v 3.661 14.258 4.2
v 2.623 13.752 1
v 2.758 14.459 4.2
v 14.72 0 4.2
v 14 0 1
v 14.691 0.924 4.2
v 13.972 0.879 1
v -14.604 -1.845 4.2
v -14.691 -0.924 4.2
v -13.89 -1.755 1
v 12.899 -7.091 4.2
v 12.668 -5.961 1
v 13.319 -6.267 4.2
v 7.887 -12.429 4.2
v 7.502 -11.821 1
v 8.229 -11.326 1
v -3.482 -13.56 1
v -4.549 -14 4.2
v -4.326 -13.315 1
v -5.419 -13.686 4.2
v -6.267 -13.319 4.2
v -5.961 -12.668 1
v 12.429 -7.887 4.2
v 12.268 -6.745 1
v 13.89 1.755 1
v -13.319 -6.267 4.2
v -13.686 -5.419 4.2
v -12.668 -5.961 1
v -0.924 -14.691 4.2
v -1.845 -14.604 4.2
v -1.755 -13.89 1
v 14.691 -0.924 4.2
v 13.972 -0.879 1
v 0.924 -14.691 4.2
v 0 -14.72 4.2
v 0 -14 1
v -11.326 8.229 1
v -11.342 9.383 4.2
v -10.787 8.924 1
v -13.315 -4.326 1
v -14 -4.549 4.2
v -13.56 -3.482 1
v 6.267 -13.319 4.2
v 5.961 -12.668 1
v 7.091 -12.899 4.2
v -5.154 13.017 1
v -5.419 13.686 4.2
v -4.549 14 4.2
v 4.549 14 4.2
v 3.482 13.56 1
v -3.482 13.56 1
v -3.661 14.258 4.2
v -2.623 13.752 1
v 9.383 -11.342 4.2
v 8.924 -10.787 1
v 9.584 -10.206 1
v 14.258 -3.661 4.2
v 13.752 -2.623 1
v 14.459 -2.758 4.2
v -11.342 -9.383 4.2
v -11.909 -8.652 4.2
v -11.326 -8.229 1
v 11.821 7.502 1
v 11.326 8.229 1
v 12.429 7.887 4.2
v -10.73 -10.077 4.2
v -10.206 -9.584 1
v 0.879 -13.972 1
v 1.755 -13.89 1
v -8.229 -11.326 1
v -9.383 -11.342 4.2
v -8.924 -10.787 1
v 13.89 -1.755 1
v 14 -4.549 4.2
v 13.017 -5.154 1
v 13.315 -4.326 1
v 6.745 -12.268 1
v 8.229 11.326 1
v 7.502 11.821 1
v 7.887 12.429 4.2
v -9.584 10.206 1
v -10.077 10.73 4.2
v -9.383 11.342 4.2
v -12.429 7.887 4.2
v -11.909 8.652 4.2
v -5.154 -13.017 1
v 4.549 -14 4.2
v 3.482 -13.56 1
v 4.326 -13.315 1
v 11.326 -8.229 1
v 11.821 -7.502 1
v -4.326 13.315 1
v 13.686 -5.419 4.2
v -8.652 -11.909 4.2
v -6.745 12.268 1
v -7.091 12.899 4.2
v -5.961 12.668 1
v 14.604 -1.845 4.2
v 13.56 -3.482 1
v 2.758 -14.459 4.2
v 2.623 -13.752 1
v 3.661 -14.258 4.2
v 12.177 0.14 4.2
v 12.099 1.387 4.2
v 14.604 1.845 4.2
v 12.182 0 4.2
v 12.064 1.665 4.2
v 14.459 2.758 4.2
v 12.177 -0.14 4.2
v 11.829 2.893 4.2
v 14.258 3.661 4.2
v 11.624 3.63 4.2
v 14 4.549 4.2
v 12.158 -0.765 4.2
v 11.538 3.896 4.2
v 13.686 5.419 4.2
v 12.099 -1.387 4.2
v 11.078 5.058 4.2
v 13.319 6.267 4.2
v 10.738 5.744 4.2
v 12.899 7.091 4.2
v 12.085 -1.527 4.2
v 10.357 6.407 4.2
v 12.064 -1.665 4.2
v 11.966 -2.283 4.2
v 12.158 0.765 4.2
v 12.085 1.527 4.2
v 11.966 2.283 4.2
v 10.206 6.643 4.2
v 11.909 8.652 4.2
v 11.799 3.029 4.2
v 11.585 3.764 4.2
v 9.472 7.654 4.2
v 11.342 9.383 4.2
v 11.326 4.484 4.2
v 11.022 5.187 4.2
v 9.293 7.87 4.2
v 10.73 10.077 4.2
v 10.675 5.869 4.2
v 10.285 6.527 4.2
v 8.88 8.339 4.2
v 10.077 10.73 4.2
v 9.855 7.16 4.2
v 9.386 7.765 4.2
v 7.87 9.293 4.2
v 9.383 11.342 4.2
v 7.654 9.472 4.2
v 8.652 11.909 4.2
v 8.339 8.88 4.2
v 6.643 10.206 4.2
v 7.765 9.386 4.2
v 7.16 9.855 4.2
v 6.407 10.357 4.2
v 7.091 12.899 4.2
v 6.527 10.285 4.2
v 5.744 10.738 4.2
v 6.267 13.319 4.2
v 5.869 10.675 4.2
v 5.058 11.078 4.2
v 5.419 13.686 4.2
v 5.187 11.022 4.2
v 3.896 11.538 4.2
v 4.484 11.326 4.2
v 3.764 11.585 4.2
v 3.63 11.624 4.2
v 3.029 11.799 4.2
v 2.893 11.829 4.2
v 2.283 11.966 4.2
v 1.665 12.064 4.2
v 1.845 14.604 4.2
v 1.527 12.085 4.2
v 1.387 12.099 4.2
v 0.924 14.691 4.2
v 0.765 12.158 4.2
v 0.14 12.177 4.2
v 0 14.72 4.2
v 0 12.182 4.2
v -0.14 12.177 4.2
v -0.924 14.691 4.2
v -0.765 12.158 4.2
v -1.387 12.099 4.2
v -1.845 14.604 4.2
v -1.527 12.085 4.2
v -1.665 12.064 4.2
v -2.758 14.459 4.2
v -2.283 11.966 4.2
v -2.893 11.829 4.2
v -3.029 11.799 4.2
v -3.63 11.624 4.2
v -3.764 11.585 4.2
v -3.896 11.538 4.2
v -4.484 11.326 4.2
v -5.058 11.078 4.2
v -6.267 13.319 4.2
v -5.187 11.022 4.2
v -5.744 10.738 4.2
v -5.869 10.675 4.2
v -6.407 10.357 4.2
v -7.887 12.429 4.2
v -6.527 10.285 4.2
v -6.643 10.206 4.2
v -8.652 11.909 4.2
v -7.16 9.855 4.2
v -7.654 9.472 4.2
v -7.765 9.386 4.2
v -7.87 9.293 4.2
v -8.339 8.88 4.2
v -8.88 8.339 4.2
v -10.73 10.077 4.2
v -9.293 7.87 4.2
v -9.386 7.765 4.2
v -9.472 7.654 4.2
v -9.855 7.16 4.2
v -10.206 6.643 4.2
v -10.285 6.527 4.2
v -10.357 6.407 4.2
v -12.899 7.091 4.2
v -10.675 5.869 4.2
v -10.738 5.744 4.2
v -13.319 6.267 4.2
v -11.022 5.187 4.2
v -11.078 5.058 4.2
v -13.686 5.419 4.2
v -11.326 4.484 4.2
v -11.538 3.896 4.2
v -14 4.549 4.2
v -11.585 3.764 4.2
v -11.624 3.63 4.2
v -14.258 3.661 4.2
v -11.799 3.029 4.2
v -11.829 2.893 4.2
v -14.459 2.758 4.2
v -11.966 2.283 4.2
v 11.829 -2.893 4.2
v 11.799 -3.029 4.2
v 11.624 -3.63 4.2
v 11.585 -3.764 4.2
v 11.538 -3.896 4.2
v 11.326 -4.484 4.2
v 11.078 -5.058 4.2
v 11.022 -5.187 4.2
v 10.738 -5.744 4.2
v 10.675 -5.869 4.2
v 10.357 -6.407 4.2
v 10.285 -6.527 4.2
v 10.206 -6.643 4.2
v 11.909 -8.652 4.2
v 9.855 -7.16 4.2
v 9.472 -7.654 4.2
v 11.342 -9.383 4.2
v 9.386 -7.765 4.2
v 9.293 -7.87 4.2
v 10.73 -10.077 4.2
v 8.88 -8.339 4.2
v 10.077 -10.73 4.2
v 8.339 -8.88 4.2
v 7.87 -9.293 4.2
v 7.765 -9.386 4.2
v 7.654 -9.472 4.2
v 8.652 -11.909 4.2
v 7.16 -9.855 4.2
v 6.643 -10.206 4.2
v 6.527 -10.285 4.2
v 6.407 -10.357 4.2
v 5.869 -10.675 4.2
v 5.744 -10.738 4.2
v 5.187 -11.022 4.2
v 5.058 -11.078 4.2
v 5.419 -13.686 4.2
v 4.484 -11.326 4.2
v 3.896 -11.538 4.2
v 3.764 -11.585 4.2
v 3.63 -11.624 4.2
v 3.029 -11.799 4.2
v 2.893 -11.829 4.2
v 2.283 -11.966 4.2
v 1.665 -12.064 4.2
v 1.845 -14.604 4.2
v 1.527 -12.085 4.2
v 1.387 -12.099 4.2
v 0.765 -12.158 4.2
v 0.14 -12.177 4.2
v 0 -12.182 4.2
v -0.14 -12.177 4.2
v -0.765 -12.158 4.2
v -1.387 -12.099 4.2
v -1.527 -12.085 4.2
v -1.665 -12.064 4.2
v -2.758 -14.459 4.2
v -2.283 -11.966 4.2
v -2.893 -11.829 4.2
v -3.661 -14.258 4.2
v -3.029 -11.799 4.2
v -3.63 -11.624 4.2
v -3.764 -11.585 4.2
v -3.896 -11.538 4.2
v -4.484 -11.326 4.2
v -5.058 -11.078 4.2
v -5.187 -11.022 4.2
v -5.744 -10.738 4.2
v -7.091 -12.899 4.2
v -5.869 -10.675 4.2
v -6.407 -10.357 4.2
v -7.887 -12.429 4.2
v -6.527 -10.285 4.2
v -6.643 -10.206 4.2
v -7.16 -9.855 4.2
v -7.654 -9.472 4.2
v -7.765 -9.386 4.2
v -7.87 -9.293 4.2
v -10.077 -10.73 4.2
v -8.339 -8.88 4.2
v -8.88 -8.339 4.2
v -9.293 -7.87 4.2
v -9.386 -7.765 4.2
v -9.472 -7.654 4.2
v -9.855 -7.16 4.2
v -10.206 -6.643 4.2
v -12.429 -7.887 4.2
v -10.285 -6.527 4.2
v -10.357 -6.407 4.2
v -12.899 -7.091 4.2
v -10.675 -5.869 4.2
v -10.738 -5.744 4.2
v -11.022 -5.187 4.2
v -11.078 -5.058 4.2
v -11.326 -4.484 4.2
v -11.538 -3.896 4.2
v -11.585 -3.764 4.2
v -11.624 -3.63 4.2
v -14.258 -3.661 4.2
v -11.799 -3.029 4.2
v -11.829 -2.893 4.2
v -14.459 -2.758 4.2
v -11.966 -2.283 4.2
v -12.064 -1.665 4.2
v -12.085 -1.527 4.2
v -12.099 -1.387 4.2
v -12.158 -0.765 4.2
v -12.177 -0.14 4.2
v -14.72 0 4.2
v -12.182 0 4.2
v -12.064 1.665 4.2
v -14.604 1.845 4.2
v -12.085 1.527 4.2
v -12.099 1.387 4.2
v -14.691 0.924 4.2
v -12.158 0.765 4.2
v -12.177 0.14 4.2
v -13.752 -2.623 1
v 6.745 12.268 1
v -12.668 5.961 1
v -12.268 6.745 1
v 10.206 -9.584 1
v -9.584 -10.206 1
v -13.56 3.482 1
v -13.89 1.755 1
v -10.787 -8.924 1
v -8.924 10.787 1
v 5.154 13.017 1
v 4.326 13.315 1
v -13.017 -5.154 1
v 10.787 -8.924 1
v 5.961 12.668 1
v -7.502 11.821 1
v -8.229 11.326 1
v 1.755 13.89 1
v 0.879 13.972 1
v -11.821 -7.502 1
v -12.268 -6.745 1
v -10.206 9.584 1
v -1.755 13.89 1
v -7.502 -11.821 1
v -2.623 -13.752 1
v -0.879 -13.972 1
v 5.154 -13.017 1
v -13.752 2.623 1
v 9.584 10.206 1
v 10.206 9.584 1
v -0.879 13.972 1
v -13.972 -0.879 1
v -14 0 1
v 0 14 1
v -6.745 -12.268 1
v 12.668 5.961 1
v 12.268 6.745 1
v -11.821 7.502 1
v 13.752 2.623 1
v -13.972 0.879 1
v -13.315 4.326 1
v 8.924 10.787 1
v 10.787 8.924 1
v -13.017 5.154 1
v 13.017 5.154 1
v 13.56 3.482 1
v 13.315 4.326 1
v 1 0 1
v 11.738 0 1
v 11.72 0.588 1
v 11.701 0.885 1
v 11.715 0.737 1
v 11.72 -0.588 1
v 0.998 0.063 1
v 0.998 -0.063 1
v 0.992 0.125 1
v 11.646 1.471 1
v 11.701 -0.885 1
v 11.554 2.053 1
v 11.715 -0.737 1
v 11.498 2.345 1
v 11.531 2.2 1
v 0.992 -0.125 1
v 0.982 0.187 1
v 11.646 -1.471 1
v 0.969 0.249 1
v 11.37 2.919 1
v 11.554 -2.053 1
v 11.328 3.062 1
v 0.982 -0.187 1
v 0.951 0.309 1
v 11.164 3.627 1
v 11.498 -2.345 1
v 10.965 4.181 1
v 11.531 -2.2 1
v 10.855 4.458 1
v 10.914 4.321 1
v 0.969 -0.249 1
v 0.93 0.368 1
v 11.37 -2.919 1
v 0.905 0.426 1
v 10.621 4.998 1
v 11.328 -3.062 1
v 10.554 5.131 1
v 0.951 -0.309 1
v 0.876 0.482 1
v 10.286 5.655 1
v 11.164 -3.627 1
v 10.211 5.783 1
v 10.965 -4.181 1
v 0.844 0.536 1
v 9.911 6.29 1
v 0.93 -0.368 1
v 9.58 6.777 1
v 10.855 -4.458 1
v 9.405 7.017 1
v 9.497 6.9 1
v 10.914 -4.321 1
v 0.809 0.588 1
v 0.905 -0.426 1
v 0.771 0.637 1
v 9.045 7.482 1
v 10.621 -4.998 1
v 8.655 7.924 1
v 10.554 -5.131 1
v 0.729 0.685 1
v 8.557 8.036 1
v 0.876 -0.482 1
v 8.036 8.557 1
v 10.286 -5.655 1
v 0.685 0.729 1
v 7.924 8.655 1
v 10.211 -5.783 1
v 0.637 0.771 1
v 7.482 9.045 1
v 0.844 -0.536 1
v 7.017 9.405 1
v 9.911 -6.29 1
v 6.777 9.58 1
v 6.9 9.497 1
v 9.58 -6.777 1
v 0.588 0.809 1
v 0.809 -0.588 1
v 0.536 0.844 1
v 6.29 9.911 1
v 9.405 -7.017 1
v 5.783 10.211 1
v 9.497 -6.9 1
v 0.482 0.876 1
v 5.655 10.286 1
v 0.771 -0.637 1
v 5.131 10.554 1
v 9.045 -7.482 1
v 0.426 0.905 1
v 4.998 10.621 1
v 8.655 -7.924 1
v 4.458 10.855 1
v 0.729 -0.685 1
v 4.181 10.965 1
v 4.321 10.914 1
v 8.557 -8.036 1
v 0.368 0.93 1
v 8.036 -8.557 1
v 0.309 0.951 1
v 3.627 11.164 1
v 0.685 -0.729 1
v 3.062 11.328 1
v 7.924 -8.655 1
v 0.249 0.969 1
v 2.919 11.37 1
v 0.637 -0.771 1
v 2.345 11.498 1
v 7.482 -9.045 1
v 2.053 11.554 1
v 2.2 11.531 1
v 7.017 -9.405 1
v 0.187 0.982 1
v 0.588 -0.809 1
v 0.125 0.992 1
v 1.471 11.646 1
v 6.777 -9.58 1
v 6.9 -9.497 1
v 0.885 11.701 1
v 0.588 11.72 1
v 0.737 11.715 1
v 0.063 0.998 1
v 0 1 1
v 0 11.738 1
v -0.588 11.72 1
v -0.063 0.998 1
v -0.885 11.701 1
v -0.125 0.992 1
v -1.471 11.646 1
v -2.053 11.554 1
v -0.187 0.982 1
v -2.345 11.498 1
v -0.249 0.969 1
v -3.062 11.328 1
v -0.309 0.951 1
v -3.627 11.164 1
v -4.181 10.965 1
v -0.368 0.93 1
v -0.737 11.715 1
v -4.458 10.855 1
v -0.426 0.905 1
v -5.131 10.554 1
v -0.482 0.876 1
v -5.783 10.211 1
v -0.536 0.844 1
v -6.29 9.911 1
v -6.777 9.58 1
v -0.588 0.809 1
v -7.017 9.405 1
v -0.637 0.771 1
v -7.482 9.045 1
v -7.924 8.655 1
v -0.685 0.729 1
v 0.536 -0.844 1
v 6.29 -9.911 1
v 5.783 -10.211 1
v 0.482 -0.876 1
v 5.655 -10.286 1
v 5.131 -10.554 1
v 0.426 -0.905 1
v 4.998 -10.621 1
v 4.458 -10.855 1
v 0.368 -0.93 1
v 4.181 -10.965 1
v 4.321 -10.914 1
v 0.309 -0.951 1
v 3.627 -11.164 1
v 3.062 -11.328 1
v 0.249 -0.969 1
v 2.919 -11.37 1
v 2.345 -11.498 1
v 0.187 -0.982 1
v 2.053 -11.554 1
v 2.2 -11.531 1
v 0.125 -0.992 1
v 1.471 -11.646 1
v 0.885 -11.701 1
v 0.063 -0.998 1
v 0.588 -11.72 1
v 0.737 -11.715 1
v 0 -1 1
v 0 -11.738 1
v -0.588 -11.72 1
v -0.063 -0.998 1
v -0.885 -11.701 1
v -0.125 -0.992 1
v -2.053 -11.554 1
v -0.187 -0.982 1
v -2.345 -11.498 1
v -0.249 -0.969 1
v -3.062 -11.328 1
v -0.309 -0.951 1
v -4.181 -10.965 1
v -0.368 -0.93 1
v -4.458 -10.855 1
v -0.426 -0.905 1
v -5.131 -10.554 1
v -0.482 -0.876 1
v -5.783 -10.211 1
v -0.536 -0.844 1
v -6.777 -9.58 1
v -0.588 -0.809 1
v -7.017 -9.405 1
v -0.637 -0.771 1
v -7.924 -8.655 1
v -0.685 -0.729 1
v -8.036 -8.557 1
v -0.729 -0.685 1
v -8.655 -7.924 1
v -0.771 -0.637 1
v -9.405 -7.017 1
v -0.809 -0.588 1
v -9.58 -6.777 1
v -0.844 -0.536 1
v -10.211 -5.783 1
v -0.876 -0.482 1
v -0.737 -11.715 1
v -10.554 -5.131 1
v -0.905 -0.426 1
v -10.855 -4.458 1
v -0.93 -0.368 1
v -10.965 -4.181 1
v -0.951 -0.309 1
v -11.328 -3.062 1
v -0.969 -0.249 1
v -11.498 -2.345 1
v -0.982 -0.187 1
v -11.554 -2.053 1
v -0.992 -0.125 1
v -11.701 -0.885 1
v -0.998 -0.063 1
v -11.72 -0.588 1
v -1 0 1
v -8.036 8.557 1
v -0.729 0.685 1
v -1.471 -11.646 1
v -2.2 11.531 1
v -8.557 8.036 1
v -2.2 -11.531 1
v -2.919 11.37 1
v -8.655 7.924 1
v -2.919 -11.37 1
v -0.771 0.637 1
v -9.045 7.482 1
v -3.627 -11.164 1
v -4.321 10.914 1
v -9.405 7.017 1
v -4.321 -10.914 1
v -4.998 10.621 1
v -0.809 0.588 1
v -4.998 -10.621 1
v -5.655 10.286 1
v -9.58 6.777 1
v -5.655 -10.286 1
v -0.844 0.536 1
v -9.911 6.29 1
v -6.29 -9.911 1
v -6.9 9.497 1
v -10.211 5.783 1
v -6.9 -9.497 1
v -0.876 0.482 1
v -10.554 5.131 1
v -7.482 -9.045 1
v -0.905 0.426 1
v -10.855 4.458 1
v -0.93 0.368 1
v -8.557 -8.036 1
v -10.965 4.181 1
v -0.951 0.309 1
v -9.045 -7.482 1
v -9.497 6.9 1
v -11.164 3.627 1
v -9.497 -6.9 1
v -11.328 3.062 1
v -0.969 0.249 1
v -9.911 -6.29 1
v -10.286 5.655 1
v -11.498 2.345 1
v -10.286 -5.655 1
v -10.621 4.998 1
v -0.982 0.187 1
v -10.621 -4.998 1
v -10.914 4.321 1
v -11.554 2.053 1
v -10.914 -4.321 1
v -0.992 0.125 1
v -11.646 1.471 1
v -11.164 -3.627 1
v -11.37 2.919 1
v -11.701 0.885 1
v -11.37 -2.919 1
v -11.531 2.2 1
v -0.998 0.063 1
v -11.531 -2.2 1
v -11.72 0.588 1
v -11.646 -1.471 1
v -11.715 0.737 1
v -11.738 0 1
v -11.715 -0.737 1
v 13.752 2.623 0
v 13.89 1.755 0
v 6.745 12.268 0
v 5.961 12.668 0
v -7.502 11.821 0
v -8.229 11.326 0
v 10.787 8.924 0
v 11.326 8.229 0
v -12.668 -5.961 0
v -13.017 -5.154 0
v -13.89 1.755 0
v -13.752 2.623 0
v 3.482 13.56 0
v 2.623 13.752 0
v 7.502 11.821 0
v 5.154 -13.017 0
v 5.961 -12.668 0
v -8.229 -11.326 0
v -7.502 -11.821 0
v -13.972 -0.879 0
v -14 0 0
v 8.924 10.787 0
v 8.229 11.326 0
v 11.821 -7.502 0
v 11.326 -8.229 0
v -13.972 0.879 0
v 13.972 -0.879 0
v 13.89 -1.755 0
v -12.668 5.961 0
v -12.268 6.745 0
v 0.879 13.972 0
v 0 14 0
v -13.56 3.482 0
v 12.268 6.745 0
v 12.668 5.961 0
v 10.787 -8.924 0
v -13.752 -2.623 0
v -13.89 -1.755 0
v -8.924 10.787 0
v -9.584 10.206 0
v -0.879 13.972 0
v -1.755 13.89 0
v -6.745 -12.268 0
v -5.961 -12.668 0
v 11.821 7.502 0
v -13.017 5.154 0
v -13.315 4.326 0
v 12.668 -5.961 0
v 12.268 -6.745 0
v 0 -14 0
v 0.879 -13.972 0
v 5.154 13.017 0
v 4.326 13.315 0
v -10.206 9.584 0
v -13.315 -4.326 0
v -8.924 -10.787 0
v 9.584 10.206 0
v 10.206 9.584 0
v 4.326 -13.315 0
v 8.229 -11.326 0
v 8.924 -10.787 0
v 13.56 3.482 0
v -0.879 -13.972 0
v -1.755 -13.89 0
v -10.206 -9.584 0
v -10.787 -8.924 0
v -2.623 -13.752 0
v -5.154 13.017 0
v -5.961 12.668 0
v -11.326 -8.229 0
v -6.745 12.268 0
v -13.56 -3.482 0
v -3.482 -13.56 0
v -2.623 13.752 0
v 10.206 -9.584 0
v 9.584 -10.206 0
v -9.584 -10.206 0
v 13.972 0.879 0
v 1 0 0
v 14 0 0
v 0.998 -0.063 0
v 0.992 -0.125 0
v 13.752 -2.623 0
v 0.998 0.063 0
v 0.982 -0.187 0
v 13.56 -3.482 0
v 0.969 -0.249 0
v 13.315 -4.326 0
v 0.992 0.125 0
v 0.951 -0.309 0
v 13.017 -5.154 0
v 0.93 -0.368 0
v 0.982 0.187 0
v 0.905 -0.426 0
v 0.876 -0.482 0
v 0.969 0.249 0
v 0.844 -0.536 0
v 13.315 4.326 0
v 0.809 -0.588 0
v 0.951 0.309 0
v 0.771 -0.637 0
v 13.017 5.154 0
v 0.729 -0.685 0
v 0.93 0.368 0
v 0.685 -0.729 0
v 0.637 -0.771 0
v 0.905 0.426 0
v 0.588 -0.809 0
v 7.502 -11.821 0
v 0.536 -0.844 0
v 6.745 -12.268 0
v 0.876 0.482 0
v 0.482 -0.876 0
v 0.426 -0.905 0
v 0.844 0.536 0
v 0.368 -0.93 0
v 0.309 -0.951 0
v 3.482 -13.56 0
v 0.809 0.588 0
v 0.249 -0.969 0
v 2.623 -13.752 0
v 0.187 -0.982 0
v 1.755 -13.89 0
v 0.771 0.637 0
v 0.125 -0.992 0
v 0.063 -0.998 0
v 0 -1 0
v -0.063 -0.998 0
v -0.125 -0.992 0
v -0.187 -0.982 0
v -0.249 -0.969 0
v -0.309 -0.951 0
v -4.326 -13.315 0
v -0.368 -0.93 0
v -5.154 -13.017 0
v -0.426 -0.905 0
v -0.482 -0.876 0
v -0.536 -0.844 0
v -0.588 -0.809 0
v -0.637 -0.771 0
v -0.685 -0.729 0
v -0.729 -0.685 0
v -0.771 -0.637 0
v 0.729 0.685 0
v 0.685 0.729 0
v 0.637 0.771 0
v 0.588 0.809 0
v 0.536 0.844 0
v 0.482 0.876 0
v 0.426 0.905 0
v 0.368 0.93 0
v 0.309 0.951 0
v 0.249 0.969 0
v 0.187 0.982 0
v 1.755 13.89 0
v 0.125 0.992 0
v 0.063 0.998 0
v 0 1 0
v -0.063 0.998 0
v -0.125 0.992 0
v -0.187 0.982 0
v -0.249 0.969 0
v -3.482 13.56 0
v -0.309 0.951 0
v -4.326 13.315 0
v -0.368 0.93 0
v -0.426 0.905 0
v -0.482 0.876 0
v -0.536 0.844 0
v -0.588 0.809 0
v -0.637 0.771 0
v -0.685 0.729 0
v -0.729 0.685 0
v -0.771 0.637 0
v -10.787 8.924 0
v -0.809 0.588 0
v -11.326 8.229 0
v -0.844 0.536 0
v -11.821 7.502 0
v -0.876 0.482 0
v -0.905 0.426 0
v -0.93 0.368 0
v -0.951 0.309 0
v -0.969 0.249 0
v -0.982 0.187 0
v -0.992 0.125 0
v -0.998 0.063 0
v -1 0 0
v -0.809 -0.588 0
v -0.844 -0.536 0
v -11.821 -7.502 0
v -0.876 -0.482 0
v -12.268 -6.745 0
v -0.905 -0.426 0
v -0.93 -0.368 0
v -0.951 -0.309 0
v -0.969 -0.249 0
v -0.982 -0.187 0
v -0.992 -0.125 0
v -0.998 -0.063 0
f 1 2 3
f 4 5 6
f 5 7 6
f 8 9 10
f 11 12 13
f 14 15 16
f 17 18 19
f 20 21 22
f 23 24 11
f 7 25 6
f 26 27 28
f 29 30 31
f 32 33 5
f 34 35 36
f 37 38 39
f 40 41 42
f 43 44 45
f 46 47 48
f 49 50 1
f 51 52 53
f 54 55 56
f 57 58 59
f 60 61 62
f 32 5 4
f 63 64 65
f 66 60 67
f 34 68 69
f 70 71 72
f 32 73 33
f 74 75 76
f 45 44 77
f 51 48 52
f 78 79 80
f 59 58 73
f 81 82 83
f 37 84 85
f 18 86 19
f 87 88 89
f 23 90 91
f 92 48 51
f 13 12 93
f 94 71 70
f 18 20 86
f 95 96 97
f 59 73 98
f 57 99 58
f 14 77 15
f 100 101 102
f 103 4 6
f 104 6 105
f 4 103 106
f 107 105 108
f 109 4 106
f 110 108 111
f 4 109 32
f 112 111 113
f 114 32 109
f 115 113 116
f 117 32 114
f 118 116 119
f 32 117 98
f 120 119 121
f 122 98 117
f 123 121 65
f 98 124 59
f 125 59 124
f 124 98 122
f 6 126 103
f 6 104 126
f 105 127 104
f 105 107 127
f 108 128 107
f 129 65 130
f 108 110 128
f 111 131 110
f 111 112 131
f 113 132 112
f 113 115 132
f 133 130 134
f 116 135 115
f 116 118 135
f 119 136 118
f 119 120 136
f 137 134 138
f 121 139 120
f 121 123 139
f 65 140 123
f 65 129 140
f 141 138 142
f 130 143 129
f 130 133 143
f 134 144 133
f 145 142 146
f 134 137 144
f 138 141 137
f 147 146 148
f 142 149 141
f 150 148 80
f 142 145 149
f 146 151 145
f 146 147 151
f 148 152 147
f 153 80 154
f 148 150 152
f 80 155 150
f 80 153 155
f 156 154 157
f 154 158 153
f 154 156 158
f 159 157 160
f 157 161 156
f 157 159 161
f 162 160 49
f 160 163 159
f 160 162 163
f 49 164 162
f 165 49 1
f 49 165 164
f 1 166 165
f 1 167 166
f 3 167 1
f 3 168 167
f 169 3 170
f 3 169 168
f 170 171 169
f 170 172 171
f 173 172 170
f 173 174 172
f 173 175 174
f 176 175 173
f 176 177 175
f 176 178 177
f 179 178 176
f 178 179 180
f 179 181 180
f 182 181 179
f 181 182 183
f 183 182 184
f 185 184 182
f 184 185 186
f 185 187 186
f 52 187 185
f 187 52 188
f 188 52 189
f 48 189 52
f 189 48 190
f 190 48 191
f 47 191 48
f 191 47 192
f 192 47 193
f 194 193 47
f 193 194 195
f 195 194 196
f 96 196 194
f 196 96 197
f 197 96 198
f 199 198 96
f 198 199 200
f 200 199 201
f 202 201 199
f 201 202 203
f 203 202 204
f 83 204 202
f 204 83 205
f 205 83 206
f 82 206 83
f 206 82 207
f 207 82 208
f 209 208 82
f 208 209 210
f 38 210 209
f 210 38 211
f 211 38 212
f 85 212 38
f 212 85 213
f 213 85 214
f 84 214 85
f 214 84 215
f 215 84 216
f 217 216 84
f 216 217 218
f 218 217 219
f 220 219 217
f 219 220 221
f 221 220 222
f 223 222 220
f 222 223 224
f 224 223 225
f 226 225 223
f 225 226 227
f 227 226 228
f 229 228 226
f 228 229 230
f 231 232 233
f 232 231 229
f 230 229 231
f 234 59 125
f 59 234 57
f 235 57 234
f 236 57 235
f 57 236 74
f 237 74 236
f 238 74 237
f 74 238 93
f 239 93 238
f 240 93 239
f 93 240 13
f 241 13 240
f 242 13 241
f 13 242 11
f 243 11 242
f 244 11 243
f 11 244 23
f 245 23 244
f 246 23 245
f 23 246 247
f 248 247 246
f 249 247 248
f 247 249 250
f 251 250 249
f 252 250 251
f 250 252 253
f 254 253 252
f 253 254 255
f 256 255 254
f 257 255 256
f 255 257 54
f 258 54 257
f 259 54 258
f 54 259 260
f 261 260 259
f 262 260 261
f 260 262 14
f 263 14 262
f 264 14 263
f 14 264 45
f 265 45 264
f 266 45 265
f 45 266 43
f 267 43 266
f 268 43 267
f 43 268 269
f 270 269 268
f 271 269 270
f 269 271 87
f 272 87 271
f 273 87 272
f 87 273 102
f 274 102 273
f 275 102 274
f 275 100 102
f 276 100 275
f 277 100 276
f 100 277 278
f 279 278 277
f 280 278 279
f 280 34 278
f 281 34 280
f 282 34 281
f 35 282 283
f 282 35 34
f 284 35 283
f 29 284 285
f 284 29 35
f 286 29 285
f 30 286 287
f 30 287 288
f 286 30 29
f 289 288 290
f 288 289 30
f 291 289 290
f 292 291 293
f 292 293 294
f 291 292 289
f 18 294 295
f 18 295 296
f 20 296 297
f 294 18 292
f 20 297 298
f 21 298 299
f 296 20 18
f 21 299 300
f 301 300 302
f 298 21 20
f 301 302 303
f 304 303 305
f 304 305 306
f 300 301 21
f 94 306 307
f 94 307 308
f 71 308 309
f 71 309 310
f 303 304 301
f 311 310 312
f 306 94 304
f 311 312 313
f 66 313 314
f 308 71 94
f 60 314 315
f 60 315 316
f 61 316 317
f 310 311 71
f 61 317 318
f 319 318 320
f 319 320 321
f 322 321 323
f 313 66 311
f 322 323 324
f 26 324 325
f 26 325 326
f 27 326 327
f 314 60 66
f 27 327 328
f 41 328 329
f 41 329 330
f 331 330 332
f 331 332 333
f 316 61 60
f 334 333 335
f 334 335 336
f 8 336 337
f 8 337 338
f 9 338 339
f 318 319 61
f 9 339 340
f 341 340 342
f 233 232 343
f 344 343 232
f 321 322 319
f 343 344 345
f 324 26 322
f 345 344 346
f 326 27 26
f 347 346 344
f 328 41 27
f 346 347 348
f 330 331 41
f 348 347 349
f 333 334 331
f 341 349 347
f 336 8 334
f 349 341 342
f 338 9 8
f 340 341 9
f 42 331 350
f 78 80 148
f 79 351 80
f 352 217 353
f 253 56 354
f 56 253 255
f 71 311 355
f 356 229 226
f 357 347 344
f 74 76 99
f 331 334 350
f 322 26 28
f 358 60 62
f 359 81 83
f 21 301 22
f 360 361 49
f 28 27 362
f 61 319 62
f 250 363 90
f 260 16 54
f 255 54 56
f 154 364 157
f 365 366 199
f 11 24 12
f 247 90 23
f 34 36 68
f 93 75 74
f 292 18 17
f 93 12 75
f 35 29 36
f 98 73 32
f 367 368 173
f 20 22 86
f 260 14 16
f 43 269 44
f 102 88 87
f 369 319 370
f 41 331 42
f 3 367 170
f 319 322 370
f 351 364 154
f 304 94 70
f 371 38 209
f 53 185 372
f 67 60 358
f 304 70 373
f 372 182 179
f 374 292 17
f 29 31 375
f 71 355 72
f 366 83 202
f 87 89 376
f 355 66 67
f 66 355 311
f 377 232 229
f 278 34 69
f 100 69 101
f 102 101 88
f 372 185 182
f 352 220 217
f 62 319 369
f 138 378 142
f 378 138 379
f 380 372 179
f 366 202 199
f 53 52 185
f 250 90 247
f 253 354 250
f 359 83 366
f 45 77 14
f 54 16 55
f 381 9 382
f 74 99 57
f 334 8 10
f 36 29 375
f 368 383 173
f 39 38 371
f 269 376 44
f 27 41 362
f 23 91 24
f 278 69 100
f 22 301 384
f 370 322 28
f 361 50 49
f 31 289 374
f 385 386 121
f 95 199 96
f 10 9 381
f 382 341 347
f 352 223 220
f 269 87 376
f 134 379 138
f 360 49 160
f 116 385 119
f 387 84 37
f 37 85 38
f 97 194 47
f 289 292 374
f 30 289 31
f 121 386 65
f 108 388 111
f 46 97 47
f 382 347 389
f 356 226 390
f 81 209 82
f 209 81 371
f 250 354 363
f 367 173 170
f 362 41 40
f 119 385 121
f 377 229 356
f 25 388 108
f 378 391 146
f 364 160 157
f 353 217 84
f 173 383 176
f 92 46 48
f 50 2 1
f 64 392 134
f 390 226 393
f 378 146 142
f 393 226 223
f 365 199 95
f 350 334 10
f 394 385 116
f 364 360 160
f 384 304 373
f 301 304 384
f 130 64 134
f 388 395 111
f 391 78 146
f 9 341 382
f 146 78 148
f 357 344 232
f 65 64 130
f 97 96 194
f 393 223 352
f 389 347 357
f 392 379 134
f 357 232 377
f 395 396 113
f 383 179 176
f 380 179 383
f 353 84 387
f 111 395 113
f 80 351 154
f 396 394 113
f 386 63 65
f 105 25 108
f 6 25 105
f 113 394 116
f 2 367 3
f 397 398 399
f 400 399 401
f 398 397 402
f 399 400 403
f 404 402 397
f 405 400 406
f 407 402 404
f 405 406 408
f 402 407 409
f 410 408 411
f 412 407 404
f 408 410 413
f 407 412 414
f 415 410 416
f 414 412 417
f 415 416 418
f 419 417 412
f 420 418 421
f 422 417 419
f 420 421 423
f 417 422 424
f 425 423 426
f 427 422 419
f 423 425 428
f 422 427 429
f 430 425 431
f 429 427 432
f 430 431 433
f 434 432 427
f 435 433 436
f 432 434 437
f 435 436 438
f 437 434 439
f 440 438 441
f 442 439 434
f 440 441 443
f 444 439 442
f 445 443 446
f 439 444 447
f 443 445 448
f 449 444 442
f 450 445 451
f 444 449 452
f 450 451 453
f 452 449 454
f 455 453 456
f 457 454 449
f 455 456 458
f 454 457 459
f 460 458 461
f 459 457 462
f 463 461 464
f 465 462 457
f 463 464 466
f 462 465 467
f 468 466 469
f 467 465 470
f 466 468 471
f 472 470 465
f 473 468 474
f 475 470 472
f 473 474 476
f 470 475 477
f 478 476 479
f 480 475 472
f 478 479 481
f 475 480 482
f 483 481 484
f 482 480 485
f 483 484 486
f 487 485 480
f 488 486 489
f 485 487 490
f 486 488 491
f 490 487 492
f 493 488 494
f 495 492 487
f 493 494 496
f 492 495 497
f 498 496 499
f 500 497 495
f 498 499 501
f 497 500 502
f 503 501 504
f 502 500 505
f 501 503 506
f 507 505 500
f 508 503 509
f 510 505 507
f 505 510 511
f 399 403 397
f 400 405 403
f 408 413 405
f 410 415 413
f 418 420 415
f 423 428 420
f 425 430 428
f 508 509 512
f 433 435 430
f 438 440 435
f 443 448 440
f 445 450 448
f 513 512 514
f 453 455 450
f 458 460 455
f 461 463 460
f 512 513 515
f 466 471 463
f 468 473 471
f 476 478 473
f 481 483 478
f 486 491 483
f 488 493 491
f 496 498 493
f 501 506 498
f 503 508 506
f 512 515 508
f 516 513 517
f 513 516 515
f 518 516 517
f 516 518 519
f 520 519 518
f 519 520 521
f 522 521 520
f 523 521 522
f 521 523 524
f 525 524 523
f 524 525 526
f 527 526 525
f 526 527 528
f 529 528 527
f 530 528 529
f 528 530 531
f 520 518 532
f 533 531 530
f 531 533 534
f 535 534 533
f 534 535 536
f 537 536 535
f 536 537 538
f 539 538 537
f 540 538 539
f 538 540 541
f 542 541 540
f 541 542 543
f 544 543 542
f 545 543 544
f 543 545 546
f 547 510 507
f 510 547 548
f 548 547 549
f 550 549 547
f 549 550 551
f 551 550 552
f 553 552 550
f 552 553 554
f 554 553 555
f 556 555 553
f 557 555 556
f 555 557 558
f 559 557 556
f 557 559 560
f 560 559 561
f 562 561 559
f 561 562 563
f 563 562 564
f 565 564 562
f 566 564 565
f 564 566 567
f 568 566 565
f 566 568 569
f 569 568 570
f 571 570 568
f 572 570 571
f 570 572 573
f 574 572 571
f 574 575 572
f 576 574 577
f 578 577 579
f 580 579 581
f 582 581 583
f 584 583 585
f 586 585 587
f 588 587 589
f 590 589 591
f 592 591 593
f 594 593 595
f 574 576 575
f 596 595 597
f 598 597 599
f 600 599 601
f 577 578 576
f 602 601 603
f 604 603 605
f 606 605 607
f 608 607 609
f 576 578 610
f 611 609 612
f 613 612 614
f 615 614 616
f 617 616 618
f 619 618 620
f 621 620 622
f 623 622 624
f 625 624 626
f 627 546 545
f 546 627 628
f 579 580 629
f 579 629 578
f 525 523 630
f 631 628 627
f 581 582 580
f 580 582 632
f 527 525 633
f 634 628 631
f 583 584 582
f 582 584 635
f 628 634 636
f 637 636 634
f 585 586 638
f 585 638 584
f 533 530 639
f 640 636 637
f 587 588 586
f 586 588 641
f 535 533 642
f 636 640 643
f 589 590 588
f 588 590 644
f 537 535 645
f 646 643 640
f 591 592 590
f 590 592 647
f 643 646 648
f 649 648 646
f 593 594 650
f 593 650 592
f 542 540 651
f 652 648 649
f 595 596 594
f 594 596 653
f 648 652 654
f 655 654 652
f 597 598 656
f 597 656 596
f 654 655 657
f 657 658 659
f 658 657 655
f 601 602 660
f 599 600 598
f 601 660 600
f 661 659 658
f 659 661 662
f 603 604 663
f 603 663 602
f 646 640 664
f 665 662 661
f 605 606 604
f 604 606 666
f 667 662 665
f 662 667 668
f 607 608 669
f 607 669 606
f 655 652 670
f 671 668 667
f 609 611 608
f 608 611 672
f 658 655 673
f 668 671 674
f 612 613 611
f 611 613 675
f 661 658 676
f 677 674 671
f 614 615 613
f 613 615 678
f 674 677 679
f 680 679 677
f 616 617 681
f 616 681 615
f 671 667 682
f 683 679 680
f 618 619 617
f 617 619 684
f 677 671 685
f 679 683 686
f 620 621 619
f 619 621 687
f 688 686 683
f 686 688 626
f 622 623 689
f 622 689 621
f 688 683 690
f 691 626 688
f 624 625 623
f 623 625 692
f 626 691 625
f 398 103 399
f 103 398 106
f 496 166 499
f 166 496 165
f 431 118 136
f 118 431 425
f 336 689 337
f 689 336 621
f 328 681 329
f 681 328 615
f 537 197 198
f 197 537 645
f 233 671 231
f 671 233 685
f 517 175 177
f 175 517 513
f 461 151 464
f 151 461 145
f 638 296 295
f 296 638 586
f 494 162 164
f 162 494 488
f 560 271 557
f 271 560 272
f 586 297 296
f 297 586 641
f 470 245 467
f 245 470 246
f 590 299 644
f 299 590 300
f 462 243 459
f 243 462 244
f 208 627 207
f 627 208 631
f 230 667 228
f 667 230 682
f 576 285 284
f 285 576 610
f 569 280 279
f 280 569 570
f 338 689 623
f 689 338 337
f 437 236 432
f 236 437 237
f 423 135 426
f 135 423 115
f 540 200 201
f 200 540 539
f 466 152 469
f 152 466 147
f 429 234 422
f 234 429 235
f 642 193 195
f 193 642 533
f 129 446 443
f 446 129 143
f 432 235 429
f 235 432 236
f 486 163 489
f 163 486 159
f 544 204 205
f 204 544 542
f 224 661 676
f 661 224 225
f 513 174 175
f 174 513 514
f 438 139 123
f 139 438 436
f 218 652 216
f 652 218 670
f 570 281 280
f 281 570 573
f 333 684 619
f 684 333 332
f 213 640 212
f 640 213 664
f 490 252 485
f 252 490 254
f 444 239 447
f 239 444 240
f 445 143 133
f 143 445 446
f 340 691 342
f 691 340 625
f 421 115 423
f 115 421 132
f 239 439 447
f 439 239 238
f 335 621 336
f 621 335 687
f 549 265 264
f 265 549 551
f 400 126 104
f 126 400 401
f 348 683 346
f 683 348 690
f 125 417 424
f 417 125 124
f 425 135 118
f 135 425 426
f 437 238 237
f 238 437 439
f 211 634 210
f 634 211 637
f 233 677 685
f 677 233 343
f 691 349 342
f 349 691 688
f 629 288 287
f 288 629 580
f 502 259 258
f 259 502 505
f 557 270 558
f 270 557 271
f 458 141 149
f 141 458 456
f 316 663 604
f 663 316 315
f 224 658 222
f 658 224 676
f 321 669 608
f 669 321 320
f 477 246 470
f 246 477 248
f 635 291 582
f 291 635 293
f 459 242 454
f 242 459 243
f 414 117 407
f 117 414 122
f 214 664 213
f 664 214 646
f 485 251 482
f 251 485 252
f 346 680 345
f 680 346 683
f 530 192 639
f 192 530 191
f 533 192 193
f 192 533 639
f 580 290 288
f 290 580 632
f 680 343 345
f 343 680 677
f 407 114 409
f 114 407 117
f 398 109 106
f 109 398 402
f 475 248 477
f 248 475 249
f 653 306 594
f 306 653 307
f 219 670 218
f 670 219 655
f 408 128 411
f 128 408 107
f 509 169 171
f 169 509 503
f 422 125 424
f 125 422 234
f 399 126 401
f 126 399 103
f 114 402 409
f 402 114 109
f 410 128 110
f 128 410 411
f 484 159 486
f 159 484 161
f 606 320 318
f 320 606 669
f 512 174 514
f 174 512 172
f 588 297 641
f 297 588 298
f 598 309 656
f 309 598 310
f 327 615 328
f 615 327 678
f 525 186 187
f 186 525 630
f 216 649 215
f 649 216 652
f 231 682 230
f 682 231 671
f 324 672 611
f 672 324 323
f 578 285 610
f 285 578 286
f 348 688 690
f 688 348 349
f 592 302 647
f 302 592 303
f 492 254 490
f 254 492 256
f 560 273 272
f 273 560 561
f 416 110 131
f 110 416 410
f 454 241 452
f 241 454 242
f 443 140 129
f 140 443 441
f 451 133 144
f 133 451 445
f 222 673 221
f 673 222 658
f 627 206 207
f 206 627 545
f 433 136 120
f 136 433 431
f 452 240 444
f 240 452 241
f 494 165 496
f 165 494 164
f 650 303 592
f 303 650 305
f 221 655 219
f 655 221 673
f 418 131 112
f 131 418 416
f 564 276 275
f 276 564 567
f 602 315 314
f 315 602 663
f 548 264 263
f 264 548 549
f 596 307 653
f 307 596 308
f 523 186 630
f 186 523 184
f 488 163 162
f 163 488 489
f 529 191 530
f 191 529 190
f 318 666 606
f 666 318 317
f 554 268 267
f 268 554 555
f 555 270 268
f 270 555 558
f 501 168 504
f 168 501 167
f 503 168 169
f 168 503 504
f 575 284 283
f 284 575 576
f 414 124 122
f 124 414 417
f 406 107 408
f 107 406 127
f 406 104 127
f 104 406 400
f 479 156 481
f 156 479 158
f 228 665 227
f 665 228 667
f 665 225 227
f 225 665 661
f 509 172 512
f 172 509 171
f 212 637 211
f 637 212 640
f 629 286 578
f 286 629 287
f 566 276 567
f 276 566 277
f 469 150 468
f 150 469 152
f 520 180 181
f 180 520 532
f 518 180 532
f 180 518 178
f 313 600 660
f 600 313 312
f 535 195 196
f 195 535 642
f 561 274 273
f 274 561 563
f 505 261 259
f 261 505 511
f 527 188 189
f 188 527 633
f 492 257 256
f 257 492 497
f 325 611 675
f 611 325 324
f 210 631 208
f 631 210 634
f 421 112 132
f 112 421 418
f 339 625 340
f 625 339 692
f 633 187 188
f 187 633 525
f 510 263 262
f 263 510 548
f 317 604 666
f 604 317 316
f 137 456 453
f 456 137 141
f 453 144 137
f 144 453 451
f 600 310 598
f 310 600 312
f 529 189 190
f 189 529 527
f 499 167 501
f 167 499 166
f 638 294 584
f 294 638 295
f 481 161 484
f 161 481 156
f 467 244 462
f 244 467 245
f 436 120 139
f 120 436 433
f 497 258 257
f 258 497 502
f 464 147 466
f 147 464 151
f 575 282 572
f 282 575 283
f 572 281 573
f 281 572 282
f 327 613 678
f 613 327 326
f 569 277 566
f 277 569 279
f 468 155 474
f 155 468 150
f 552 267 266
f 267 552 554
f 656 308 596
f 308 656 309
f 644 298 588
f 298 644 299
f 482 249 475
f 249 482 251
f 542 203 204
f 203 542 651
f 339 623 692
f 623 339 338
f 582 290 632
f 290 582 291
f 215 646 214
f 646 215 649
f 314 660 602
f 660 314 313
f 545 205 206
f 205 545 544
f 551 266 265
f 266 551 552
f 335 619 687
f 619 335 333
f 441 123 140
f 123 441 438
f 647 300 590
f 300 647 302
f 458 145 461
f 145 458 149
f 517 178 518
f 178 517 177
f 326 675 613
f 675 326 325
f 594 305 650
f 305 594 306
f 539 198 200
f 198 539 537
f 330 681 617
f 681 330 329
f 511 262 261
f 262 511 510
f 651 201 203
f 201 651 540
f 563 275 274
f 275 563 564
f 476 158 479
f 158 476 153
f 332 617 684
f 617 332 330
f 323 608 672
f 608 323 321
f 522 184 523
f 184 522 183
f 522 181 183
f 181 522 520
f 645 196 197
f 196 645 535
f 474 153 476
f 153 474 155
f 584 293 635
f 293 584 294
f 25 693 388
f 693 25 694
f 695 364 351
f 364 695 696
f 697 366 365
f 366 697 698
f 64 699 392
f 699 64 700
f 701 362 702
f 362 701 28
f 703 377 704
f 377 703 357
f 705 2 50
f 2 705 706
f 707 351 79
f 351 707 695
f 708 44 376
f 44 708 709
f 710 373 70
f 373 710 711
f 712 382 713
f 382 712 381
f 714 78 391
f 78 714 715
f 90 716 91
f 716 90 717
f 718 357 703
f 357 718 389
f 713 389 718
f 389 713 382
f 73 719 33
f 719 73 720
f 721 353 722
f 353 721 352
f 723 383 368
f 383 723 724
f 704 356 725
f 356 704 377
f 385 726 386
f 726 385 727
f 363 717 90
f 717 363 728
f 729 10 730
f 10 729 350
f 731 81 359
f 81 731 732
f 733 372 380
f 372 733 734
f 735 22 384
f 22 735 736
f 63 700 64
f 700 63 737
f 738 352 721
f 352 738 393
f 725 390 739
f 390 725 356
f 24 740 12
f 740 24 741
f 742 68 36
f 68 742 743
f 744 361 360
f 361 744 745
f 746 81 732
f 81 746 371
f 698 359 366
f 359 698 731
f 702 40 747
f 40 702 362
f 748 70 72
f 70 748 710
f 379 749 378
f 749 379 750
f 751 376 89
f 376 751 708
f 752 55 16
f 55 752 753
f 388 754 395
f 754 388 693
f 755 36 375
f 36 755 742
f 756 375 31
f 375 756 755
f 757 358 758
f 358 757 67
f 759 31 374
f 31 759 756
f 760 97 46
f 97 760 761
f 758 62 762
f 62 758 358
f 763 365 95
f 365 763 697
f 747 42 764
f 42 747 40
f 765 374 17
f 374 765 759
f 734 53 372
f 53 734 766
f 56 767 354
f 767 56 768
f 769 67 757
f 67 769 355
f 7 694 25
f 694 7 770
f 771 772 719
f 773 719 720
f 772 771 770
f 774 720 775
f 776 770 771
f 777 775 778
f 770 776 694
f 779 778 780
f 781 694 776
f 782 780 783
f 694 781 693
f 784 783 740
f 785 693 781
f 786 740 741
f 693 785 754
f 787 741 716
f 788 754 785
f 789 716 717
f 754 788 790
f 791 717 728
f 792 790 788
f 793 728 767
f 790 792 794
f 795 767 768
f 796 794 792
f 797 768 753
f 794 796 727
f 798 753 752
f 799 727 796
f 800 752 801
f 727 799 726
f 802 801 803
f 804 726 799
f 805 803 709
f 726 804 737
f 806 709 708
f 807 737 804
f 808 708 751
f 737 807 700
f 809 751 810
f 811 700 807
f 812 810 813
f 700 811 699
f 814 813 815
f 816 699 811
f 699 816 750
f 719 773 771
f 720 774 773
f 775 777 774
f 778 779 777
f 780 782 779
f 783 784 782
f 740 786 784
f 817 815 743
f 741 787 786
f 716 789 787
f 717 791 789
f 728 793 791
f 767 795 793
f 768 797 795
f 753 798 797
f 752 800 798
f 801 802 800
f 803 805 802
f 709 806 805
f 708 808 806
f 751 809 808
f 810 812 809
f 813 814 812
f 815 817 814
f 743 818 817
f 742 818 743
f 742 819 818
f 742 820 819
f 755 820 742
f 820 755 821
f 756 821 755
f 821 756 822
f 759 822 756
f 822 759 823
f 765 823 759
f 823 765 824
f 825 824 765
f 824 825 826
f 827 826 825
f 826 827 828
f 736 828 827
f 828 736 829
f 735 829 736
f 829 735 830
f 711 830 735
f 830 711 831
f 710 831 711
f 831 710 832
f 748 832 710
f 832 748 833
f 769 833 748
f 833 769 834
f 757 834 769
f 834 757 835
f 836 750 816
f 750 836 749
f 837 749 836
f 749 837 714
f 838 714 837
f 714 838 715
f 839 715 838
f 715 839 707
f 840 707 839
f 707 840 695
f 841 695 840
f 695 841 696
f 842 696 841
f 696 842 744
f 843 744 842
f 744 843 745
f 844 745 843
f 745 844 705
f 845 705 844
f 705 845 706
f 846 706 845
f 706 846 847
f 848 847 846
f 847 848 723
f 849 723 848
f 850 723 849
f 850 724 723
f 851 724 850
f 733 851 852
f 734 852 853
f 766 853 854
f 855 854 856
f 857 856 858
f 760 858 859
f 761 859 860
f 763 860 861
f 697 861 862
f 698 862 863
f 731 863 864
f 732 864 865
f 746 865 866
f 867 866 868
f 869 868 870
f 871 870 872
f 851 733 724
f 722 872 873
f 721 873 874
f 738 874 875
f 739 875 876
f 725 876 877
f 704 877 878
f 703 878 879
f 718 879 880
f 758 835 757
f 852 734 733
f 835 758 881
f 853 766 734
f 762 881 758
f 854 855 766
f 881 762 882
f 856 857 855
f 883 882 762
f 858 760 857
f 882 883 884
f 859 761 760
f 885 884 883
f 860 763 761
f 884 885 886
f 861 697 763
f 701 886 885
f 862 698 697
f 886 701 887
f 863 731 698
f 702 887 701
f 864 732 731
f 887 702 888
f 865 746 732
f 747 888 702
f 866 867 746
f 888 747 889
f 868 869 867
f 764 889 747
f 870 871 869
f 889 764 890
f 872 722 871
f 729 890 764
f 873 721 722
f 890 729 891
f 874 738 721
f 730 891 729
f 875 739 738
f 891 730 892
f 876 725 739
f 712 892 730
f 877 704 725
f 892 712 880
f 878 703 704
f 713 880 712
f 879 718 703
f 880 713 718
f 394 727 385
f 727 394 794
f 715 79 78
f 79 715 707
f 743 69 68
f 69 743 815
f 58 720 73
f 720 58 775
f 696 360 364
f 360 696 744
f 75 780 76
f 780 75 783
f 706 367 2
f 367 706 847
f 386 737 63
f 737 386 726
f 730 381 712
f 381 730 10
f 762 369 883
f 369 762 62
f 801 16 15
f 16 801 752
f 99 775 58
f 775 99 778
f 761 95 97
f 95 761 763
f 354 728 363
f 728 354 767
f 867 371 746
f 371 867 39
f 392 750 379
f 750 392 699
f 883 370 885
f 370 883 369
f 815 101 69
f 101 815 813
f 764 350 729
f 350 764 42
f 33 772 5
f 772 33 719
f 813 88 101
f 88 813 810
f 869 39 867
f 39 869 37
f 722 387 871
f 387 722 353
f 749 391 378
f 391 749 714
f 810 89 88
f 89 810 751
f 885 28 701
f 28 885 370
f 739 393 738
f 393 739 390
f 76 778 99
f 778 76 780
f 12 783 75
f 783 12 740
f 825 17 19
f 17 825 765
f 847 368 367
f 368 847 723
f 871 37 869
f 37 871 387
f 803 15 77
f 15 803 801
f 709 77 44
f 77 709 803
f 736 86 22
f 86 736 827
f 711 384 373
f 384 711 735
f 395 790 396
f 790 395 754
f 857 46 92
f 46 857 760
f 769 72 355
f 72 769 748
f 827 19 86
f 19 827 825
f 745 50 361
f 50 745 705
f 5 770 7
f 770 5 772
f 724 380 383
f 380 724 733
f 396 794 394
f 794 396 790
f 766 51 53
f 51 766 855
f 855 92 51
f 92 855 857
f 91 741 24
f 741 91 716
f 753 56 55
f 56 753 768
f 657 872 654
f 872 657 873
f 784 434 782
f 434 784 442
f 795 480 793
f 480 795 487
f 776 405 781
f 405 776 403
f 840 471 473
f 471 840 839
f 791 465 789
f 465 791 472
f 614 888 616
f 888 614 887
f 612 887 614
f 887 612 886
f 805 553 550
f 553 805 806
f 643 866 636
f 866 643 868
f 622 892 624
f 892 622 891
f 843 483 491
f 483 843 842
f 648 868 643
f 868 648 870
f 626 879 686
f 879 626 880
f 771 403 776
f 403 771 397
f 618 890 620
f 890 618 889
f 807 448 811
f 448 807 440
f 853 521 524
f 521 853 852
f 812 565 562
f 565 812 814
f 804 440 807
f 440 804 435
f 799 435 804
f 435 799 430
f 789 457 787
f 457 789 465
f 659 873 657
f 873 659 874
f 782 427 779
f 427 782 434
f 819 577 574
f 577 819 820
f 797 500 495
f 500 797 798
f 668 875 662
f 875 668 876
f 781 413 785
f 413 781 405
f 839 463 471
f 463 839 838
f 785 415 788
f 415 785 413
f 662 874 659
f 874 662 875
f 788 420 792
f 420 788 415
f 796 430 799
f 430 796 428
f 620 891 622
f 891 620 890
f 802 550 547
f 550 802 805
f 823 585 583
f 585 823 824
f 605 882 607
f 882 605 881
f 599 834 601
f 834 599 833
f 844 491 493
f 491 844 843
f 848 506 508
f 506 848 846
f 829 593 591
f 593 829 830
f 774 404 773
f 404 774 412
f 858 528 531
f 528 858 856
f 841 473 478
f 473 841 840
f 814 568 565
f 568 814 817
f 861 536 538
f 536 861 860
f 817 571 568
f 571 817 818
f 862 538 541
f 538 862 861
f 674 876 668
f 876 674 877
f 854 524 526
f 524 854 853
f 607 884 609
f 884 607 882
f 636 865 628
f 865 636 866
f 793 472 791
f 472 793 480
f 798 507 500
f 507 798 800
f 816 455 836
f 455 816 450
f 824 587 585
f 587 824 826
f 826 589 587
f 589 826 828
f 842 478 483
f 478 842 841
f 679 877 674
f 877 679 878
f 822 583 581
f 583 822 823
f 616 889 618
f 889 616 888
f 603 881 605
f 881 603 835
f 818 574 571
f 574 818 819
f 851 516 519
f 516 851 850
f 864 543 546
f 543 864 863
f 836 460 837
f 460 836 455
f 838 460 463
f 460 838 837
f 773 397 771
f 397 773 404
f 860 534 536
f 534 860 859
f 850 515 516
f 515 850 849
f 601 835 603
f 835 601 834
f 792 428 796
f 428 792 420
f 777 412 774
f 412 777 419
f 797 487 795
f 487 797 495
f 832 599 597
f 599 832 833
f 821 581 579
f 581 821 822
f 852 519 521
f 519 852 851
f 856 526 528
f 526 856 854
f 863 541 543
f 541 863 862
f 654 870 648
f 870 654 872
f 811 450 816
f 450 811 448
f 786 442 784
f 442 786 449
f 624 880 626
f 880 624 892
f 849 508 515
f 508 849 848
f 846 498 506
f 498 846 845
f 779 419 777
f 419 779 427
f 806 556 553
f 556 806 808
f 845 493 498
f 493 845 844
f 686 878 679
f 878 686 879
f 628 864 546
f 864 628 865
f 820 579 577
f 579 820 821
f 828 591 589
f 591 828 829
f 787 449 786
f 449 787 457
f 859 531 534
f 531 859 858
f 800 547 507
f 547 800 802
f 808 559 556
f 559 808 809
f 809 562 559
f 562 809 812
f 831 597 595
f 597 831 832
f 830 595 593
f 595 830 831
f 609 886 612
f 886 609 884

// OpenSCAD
// The height (in millimeters) of the leveling foot's base
base_height = 1.0; // [0.5:0.1:50]

/* [Hidden] */
faces = 100;

difference(){
    union(){ 
        translate([0,0,base_height]){
            // cone
            difference(){
                cylinder(h=3.2, r1=14, r2=14.72, $fn=faces);
                // extra height as the "cutter" must extend beyond
                // what it cuts through. It also solves rendering
                // issues on Thingispace.
                translate([0,0,-1]){
                    cylinder(h=3.2+2, r1=11.6, r2=12.32, $fn=faces);
                }
            }
            
            // bottom circle
            rotate([0,180,0]){
                cylinder(h=base_height, r=14, $fn=faces);
            };
        }
    }

    // center hole - must extend beyond what it cuts through
    translate([0,0,-1]){
        cylinder(h=base_height+2, r=1, $fn=faces);
    }
}
